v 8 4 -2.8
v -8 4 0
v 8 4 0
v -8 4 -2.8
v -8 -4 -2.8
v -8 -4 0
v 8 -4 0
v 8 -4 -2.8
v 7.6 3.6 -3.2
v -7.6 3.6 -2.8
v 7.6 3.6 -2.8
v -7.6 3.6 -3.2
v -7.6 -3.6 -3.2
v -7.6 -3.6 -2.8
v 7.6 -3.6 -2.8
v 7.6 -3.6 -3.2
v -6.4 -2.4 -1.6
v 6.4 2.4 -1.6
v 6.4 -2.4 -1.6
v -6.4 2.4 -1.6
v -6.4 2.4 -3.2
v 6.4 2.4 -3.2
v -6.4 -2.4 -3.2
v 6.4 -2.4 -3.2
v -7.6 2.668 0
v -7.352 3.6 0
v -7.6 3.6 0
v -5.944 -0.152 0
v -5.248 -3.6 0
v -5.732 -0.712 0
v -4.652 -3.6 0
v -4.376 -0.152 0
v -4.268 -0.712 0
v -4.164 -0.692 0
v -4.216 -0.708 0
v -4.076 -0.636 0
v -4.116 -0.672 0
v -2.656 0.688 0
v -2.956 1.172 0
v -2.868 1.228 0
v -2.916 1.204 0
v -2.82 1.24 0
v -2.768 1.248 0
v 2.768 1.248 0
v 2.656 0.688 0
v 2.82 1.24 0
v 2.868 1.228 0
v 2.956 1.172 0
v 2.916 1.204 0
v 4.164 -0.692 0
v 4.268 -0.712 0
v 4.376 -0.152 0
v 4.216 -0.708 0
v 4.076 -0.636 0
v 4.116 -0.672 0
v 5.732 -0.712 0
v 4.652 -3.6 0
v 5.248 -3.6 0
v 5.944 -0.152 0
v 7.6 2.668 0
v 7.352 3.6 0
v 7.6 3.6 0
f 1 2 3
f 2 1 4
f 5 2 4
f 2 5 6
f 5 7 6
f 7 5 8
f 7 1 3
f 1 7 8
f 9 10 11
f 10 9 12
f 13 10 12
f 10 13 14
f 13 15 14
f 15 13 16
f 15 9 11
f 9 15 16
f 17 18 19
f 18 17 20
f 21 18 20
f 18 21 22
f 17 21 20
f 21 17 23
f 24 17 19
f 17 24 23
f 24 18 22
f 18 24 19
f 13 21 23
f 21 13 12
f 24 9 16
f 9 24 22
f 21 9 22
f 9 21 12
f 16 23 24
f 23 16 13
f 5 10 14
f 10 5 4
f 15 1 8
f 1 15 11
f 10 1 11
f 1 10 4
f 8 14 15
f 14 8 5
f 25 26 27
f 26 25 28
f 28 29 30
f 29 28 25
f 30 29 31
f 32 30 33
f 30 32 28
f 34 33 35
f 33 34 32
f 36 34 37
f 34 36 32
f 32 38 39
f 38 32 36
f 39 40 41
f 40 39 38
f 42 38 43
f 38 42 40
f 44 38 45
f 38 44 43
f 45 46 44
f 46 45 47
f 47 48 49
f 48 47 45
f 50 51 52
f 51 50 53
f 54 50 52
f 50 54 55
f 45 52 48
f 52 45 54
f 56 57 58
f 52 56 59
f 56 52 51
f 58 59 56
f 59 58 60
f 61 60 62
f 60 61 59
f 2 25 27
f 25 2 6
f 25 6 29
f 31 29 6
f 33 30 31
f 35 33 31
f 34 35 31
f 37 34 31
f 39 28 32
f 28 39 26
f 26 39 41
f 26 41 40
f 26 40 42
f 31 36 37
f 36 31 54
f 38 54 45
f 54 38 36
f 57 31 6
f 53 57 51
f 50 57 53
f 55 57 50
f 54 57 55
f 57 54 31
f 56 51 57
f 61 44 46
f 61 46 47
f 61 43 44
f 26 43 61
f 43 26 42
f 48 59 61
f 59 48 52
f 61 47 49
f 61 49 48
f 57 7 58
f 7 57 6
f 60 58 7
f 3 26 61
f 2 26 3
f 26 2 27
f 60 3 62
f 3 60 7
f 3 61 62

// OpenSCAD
// file: ../p/box5.scad
use <../lib.scad>
function ldraw_lib__box5() = [
// 0 Box with 5 Faces and All Edges
// 0 Name: box5.dat
// 0 Author: James Jessiman
// 0 !LDRAW_ORG Primitive UPDATE 2012-01
// 0 !LICENSE Licensed under CC BY 4.0 : see CAreadme.txt
// 
// 0 BFC CERTIFY CCW
  [0,"BFC","CERTIFY"],
  [0,"BFC","CCW"],
// 
// 0 !HISTORY 2002-04-03 [sbliss] Modified for BFC compliance
// 0 !HISTORY 2002-04-25 [PTadmin] Official Update 2002-02
// 0 !HISTORY 2007-06-24 [PTadmin] Header formatted for Contributor Agreement
// 0 !HISTORY 2008-07-01 [PTadmin] Official Update 2008-01
// 0 !HISTORY 2012-02-16 [Philo] Changed to CCW
// 0 !HISTORY 2012-03-30 [PTadmin] Official Update 2012-01
// 
// 
// 2 24 1 1 1 -1 1 1
  [2,24,1,1,1,-1,1,1],
// 2 24 -1 1 1 -1 1 -1
  [2,24,-1,1,1,-1,1,-1],
// 2 24 -1 1 -1 1 1 -1
  [2,24,-1,1,-1,1,1,-1],
// 2 24 1 1 -1 1 1 1
  [2,24,1,1,-1,1,1,1],
// 2 24 1 0 1 -1 0 1
  [2,24,1,0,1,-1,0,1],
// 2 24 -1 0 1 -1 0 -1
  [2,24,-1,0,1,-1,0,-1],
// 2 24 -1 0 -1 1 0 -1
  [2,24,-1,0,-1,1,0,-1],
// 2 24 1 0 -1 1 0 1
  [2,24,1,0,-1,1,0,1],
// 2 24 1 0 1 1 1 1
  [2,24,1,0,1,1,1,1],
// 2 24 -1 0 1 -1 1 1
  [2,24,-1,0,1,-1,1,1],
// 2 24 1 0 -1 1 1 -1
  [2,24,1,0,-1,1,1,-1],
// 2 24 -1 0 -1 -1 1 -1
  [2,24,-1,0,-1,-1,1,-1],
// 4 16 -1 1 1 1 1 1 1 1 -1 -1 1 -1
  [4,16,-1,1,1,1,1,1,1,1,-1,-1,1,-1],
// 4 16 -1 1 1 -1 0 1 1 0 1 1 1 1
  [4,16,-1,1,1,-1,0,1,1,0,1,1,1,1],
// 4 16 -1 1 -1 -1 0 -1 -1 0 1 -1 1 1
  [4,16,-1,1,-1,-1,0,-1,-1,0,1,-1,1,1],
// 4 16 1 1 -1 1 0 -1 -1 0 -1 -1 1 -1
  [4,16,1,1,-1,1,0,-1,-1,0,-1,-1,1,-1],
// 4 16 1 1 1 1 0 1 1 0 -1 1 1 -1
  [4,16,1,1,1,1,0,1,1,0,-1,1,1,-1],
];
module ldraw_lib__box5(step=0, col=false, unit=2/5, alt=false, line=0.2, solid=!$preview)
    makepoly(ldraw_lib__box5(), step=step, col=col, unit=unit, alt=alt, line=line, solid=solid);
ldraw_lib__box5(line=0.2);
// file: ../p/box4.scad
use <../lib.scad>
function ldraw_lib__box4() = [
// 0 Box with 4 Faces (2 Parallel Pairs) and All Edges
// 0 Name: box4.dat
// 0 Author: James Jessiman
// 0 !LDRAW_ORG Primitive UPDATE 2012-01
// 0 !LICENSE Licensed under CC BY 4.0 : see CAreadme.txt
// 
// 0 BFC CERTIFY CCW
  [0,"BFC","CERTIFY"],
  [0,"BFC","CCW"],
// 
// 0 !HISTORY 2002-04-03 [sbliss] Modified for BFC compliance
// 0 !HISTORY 2002-04-25 [PTadmin] Official Update 2002-02
// 0 !HISTORY 2007-06-24 [PTadmin] Header formatted for Contributor Agreement
// 0 !HISTORY 2008-07-01 [PTadmin] Official Update 2008-01
// 0 !HISTORY 2012-02-16 [Philo] Changed to CCW
// 0 !HISTORY 2012-03-30 [PTadmin] Official Update 2012-01
// 
// 
// 2 24 1 1 1 -1 1 1
  [2,24,1,1,1,-1,1,1],
// 2 24 -1 1 1 -1 1 -1
  [2,24,-1,1,1,-1,1,-1],
// 2 24 -1 1 -1 1 1 -1
  [2,24,-1,1,-1,1,1,-1],
// 2 24 1 1 -1 1 1 1
  [2,24,1,1,-1,1,1,1],
// 2 24 1 0 1 -1 0 1
  [2,24,1,0,1,-1,0,1],
// 2 24 -1 0 1 -1 0 -1
  [2,24,-1,0,1,-1,0,-1],
// 2 24 -1 0 -1 1 0 -1
  [2,24,-1,0,-1,1,0,-1],
// 2 24 1 0 -1 1 0 1
  [2,24,1,0,-1,1,0,1],
// 2 24 1 0 1 1 1 1
  [2,24,1,0,1,1,1,1],
// 2 24 -1 0 1 -1 1 1
  [2,24,-1,0,1,-1,1,1],
// 2 24 1 0 -1 1 1 -1
  [2,24,1,0,-1,1,1,-1],
// 2 24 -1 0 -1 -1 1 -1
  [2,24,-1,0,-1,-1,1,-1],
// 4 16 -1 1 1 -1 0 1 1 0 1 1 1 1
  [4,16,-1,1,1,-1,0,1,1,0,1,1,1,1],
// 4 16 -1 1 -1 -1 0 -1 -1 0 1 -1 1 1
  [4,16,-1,1,-1,-1,0,-1,-1,0,1,-1,1,1],
// 4 16 1 1 -1 1 0 -1 -1 0 -1 -1 1 -1
  [4,16,1,1,-1,1,0,-1,-1,0,-1,-1,1,-1],
// 4 16 1 1 1 1 0 1 1 0 -1 1 1 -1
  [4,16,1,1,1,1,0,1,1,0,-1,1,1,-1],
];
module ldraw_lib__box4(step=0, col=false, unit=2/5, alt=false, line=0.2, solid=!$preview)
    makepoly(ldraw_lib__box4(), step=step, col=col, unit=unit, alt=alt, line=line, solid=solid);
ldraw_lib__box4(line=0.2);
// file: s/3069bs01.scad
use <../../lib.scad>
use <../../p/box4.scad>
use <../../p/box5.scad>
function ldraw_lib__s__3069bs01() = [
// 0 ~Tile  1 x  2 with Groove without Top Face
// 0 Name: s\3069bs01.dat
// 0 Author: Santeri Piippo [arezey]
// 0 !LDRAW_ORG Subpart UPDATE 2010-02
// 0 !LICENSE Licensed under CC BY 4.0 : see CAreadme.txt
// 
// 0 BFC CERTIFY CCW
  [0,"BFC","CERTIFY"],
  [0,"BFC","CCW"],
// 
// 0 !HISTORY 2010-07-05 [PTadmin] Official Update 2010-02
// 
// 
// 1 16 0 0 0 20 0 0 0 7 0 0 0 10 box4.dat
  [1,16,0,0,0,20,0,0,0,7,0,0,0,10, ldraw_lib__box4()],
// 1 16 0 7 0 19 0 0 0 1 0 0 0 9 box4.dat
  [1,16,0,7,0,19,0,0,0,1,0,0,0,9, ldraw_lib__box4()],
// 0 BFC INVERTNEXT
  [0,"BFC","INVERTNEXT"],
// 1 16 0 8 0 16 0 0 0 -4 0 0 0 6 box5.dat
  [1,16,0,8,0,16,0,0,0,-4,0,0,0,6, ldraw_lib__box5()],
// 4 16 -19 8 9 -16 8 6 -16 8 -6 -19 8 -9
  [4,16,-19,8,9,-16,8,6,-16,8,-6,-19,8,-9],
// 4 16 19 8 -9 16 8 -6 16 8 6 19 8 9
  [4,16,19,8,-9,16,8,-6,16,8,6,19,8,9],
// 4 16 19 8 9 16 8 6 -16 8 6 -19 8 9
  [4,16,19,8,9,16,8,6,-16,8,6,-19,8,9],
// 4 16 -19 8 -9 -16 8 -6 16 8 -6 19 8 -9
  [4,16,-19,8,-9,-16,8,-6,16,8,-6,19,8,-9],
// 4 16 -20 7 10 -19 7 9 -19 7 -9 -20 7 -10
  [4,16,-20,7,10,-19,7,9,-19,7,-9,-20,7,-10],
// 4 16 20 7 -10 19 7 -9 19 7 9 20 7 10
  [4,16,20,7,-10,19,7,-9,19,7,9,20,7,10],
// 4 16 20 7 10 19 7 9 -19 7 9 -20 7 10
  [4,16,20,7,10,19,7,9,-19,7,9,-20,7,10],
// 4 16 -20 7 -10 -19 7 -9 19 7 -9 20 7 -10
  [4,16,-20,7,-10,-19,7,-9,19,7,-9,20,7,-10],
// 0 //
];
module ldraw_lib__s__3069bs01(step=0, col=false, unit=2/5, alt=false, line=0.2, solid=!$preview)
    makepoly(ldraw_lib__s__3069bs01(), step=step, col=col, unit=unit, alt=alt, line=line, solid=solid);
ldraw_lib__s__3069bs01(line=0.2);
// main file
use <../lib.scad>
use <s/3069bs01.scad>
function ldraw_lib__3069bpz6() = [
// 0 Tile  1 x  2 with Dark Red Lines Pattern
// 0 Name: 3069bpz6.dat
// 0 Author: Damien Roux [Darats]
// 0 !LDRAW_ORG Part UPDATE 2019-01
// 0 !LICENSE Licensed under CC BY 4.0 : see CAreadme.txt
// 
// 0 BFC CERTIFY CCW
  [0,"BFC","CERTIFY"],
  [0,"BFC","CCW"],
// 
// 0 !KEYWORDS Brickheadz, Iron Man, Set 41492
// 
// 0 !HISTORY 2019-06-28 [PTadmin] Official Update 2019-01
// 
// 
// 1 16 0 0 0 1 0 0 0 1 0 0 0 1 s\3069bs01.dat
  [1,16,0,0,0,1,0,0,0,1,0,0,0,1, ldraw_lib__s__3069bs01()],
// 4 320 -19 0 6.67 -14.86 0 -0.38 -18.38 0 9 -19 0 9
  [4,320,-19,0,6.67,-14.86,0,-0.38,-18.38,0,9,-19,0,9],
// 4 320 -13.12 0 -9 -14.33 0 -1.78 -14.86 0 -0.38 -19 0 6.67
  [4,320,-13.12,0,-9,-14.33,0,-1.78,-14.86,0,-0.38,-19,0,6.67],
// 3 320 -14.33 0 -1.78 -13.12 0 -9 -11.63 0 -9
  [3,320,-14.33,0,-1.78,-13.12,0,-9,-11.63,0,-9],
// 4 320 -10.67 0 -1.78 -10.94 0 -0.38 -14.86 0 -0.38 -14.33 0 -1.78
  [4,320,-10.67,0,-1.78,-10.94,0,-0.38,-14.86,0,-0.38,-14.33,0,-1.78],
// 4 320 -10.54 0 -1.77 -10.41 0 -1.73 -10.94 0 -0.38 -10.67 0 -1.78
  [4,320,-10.54,0,-1.77,-10.41,0,-1.73,-10.94,0,-0.38,-10.67,0,-1.78],
// 4 320 -10.29 0 -1.68 -10.19 0 -1.59 -10.94 0 -0.38 -10.41 0 -1.73
  [4,320,-10.29,0,-1.68,-10.19,0,-1.59,-10.94,0,-0.38,-10.41,0,-1.73],
// 4 320 -10.19 0 -1.59 -6.64 0 1.72 -7.39 0 2.93 -10.94 0 -0.38
  [4,320,-10.19,0,-1.59,-6.64,0,1.72,-7.39,0,2.93,-10.94,0,-0.38],
// 4 320 -6.64 0 1.72 -7.17 0 3.07 -7.29 0 3.01 -7.39 0 2.93
  [4,320,-6.64,0,1.72,-7.17,0,3.07,-7.29,0,3.01,-7.39,0,2.93],
// 4 320 -6.64 0 1.72 -6.92 0 3.12 -7.05 0 3.1 -7.17 0 3.07
  [4,320,-6.64,0,1.72,-6.92,0,3.12,-7.05,0,3.1,-7.17,0,3.07],
// 4 320 6.92 0 3.12 -6.92 0 3.12 -6.64 0 1.72 6.64 0 1.72
  [4,320,6.92,0,3.12,-6.92,0,3.12,-6.64,0,1.72,6.64,0,1.72],
// 4 320 7.05 0 3.1 6.92 0 3.12 6.64 0 1.72 7.17 0 3.07
  [4,320,7.05,0,3.1,6.92,0,3.12,6.64,0,1.72,7.17,0,3.07],
// 4 320 7.29 0 3.01 7.17 0 3.07 6.64 0 1.72 7.39 0 2.93
  [4,320,7.29,0,3.01,7.17,0,3.07,6.64,0,1.72,7.39,0,2.93],
// 4 320 10.94 0 -0.38 10.41 0 -1.73 10.54 0 -1.77 10.67 0 -1.78
  [4,320,10.94,0,-0.38,10.41,0,-1.73,10.54,0,-1.77,10.67,0,-1.78],
// 4 320 10.94 0 -0.38 10.19 0 -1.59 10.29 0 -1.68 10.41 0 -1.73
  [4,320,10.94,0,-0.38,10.19,0,-1.59,10.29,0,-1.68,10.41,0,-1.73],
// 4 320 7.39 0 2.93 6.64 0 1.72 10.19 0 -1.59 10.94 0 -0.38
  [4,320,7.39,0,2.93,6.64,0,1.72,10.19,0,-1.59,10.94,0,-0.38],
// 3 320 14.33 0 -1.78 11.63 0 -9 13.12 0 -9
  [3,320,14.33,0,-1.78,11.63,0,-9,13.12,0,-9],
// 4 320 14.86 0 -0.38 10.94 0 -0.38 10.67 0 -1.78 14.33 0 -1.78
  [4,320,14.86,0,-0.38,10.94,0,-0.38,10.67,0,-1.78,14.33,0,-1.78],
// 4 320 14.86 0 -0.38 14.33 0 -1.78 13.12 0 -9 19 0 6.67
  [4,320,14.86,0,-0.38,14.33,0,-1.78,13.12,0,-9,19,0,6.67],
// 4 320 18.38 0 9 14.86 0 -0.38 19 0 6.67 19 0 9
  [4,320,18.38,0,9,14.86,0,-0.38,19,0,6.67,19,0,9],
// 4 16 -19 0 6.67 -19 0 9 -20 0 10 -20 0 -10
  [4,16,-19,0,6.67,-19,0,9,-20,0,10,-20,0,-10],
// 3 16 -19 0 6.67 -20 0 -10 -13.12 0 -9
  [3,16,-19,0,6.67,-20,0,-10,-13.12,0,-9],
// 3 16 -11.63 0 -9 -13.12 0 -9 -20 0 -10
  [3,16,-11.63,0,-9,-13.12,0,-9,-20,0,-10],
// 3 16 -10.67 0 -1.78 -14.33 0 -1.78 -11.63 0 -9
  [3,16,-10.67,0,-1.78,-14.33,0,-1.78,-11.63,0,-9],
// 3 16 -10.54 0 -1.77 -10.67 0 -1.78 -11.63 0 -9
  [3,16,-10.54,0,-1.77,-10.67,0,-1.78,-11.63,0,-9],
// 3 16 -10.41 0 -1.73 -10.54 0 -1.77 -11.63 0 -9
  [3,16,-10.41,0,-1.73,-10.54,0,-1.77,-11.63,0,-9],
// 3 16 -10.29 0 -1.68 -10.41 0 -1.73 -11.63 0 -9
  [3,16,-10.29,0,-1.68,-10.41,0,-1.73,-11.63,0,-9],
// 4 16 -14.86 0 -0.38 -10.94 0 -0.38 -7.39 0 2.93 -18.38 0 9
  [4,16,-14.86,0,-0.38,-10.94,0,-0.38,-7.39,0,2.93,-18.38,0,9],
// 3 16 -18.38 0 9 -7.39 0 2.93 -7.29 0 3.01
  [3,16,-18.38,0,9,-7.39,0,2.93,-7.29,0,3.01],
// 3 16 -18.38 0 9 -7.29 0 3.01 -7.17 0 3.07
  [3,16,-18.38,0,9,-7.29,0,3.01,-7.17,0,3.07],
// 3 16 -18.38 0 9 -7.17 0 3.07 -7.05 0 3.1
  [3,16,-18.38,0,9,-7.17,0,3.07,-7.05,0,3.1],
// 4 16 -10.19 0 -1.59 -10.29 0 -1.68 -11.63 0 -9 10.19 0 -1.59
  [4,16,-10.19,0,-1.59,-10.29,0,-1.68,-11.63,0,-9,10.19,0,-1.59],
// 4 16 6.64 0 1.72 -6.64 0 1.72 -10.19 0 -1.59 10.19 0 -1.59
  [4,16,6.64,0,1.72,-6.64,0,1.72,-10.19,0,-1.59,10.19,0,-1.59],
// 3 16 11.63 0 -9 -11.63 0 -9 -20 0 -10
  [3,16,11.63,0,-9,-11.63,0,-9,-20,0,-10],
// 3 16 10.54 0 -1.77 11.63 0 -9 10.67 0 -1.78
  [3,16,10.54,0,-1.77,11.63,0,-9,10.67,0,-1.78],
// 3 16 10.41 0 -1.73 11.63 0 -9 10.54 0 -1.77
  [3,16,10.41,0,-1.73,11.63,0,-9,10.54,0,-1.77],
// 3 16 10.29 0 -1.68 11.63 0 -9 10.41 0 -1.73
  [3,16,10.29,0,-1.68,11.63,0,-9,10.41,0,-1.73],
// 4 16 11.63 0 -9 10.29 0 -1.68 10.19 0 -1.59 -11.63 0 -9
  [4,16,11.63,0,-9,10.29,0,-1.68,10.19,0,-1.59,-11.63,0,-9],
// 3 16 14.33 0 -1.78 10.67 0 -1.78 11.63 0 -9
  [3,16,14.33,0,-1.78,10.67,0,-1.78,11.63,0,-9],
// 3 16 18.38 0 9 6.92 0 3.12 7.05 0 3.1
  [3,16,18.38,0,9,6.92,0,3.12,7.05,0,3.1],
// 3 16 18.38 0 9 7.05 0 3.1 7.17 0 3.07
  [3,16,18.38,0,9,7.05,0,3.1,7.17,0,3.07],
// 3 16 18.38 0 9 -6.92 0 3.12 6.92 0 3.12
  [3,16,18.38,0,9,-6.92,0,3.12,6.92,0,3.12],
// 4 16 -18.38 0 9 -7.05 0 3.1 -6.92 0 3.12 18.38 0 9
  [4,16,-18.38,0,9,-7.05,0,3.1,-6.92,0,3.12,18.38,0,9],
// 4 16 7.39 0 2.93 10.94 0 -0.38 14.86 0 -0.38 18.38 0 9
  [4,16,7.39,0,2.93,10.94,0,-0.38,14.86,0,-0.38,18.38,0,9],
// 3 16 18.38 0 9 7.17 0 3.07 7.29 0 3.01
  [3,16,18.38,0,9,7.17,0,3.07,7.29,0,3.01],
// 3 16 18.38 0 9 7.29 0 3.01 7.39 0 2.93
  [3,16,18.38,0,9,7.29,0,3.01,7.39,0,2.93],
// 4 16 20 0 -10 13.12 0 -9 11.63 0 -9 -20 0 -10
  [4,16,20,0,-10,13.12,0,-9,11.63,0,-9,-20,0,-10],
// 3 16 19 0 6.67 13.12 0 -9 20 0 -10
  [3,16,19,0,6.67,13.12,0,-9,20,0,-10],
// 3 16 20 0 10 -18.38 0 9 18.38 0 9
  [3,16,20,0,10,-18.38,0,9,18.38,0,9],
// 4 16 -20 0 10 -19 0 9 -18.38 0 9 20 0 10
  [4,16,-20,0,10,-19,0,9,-18.38,0,9,20,0,10],
// 4 16 20 0 10 19 0 9 19 0 6.67 20 0 -10
  [4,16,20,0,10,19,0,9,19,0,6.67,20,0,-10],
// 3 16 20 0 10 18.38 0 9 19 0 9
  [3,16,20,0,10,18.38,0,9,19,0,9],
];
module ldraw_lib__3069bpz6(step=0, col=false, unit=2/5, alt=false, line=0.2, solid=!$preview)
    makepoly(ldraw_lib__3069bpz6(), step=step, col=col, unit=unit, alt=alt, line=line, solid=solid);
ldraw_lib__3069bpz6(line=0.2);
